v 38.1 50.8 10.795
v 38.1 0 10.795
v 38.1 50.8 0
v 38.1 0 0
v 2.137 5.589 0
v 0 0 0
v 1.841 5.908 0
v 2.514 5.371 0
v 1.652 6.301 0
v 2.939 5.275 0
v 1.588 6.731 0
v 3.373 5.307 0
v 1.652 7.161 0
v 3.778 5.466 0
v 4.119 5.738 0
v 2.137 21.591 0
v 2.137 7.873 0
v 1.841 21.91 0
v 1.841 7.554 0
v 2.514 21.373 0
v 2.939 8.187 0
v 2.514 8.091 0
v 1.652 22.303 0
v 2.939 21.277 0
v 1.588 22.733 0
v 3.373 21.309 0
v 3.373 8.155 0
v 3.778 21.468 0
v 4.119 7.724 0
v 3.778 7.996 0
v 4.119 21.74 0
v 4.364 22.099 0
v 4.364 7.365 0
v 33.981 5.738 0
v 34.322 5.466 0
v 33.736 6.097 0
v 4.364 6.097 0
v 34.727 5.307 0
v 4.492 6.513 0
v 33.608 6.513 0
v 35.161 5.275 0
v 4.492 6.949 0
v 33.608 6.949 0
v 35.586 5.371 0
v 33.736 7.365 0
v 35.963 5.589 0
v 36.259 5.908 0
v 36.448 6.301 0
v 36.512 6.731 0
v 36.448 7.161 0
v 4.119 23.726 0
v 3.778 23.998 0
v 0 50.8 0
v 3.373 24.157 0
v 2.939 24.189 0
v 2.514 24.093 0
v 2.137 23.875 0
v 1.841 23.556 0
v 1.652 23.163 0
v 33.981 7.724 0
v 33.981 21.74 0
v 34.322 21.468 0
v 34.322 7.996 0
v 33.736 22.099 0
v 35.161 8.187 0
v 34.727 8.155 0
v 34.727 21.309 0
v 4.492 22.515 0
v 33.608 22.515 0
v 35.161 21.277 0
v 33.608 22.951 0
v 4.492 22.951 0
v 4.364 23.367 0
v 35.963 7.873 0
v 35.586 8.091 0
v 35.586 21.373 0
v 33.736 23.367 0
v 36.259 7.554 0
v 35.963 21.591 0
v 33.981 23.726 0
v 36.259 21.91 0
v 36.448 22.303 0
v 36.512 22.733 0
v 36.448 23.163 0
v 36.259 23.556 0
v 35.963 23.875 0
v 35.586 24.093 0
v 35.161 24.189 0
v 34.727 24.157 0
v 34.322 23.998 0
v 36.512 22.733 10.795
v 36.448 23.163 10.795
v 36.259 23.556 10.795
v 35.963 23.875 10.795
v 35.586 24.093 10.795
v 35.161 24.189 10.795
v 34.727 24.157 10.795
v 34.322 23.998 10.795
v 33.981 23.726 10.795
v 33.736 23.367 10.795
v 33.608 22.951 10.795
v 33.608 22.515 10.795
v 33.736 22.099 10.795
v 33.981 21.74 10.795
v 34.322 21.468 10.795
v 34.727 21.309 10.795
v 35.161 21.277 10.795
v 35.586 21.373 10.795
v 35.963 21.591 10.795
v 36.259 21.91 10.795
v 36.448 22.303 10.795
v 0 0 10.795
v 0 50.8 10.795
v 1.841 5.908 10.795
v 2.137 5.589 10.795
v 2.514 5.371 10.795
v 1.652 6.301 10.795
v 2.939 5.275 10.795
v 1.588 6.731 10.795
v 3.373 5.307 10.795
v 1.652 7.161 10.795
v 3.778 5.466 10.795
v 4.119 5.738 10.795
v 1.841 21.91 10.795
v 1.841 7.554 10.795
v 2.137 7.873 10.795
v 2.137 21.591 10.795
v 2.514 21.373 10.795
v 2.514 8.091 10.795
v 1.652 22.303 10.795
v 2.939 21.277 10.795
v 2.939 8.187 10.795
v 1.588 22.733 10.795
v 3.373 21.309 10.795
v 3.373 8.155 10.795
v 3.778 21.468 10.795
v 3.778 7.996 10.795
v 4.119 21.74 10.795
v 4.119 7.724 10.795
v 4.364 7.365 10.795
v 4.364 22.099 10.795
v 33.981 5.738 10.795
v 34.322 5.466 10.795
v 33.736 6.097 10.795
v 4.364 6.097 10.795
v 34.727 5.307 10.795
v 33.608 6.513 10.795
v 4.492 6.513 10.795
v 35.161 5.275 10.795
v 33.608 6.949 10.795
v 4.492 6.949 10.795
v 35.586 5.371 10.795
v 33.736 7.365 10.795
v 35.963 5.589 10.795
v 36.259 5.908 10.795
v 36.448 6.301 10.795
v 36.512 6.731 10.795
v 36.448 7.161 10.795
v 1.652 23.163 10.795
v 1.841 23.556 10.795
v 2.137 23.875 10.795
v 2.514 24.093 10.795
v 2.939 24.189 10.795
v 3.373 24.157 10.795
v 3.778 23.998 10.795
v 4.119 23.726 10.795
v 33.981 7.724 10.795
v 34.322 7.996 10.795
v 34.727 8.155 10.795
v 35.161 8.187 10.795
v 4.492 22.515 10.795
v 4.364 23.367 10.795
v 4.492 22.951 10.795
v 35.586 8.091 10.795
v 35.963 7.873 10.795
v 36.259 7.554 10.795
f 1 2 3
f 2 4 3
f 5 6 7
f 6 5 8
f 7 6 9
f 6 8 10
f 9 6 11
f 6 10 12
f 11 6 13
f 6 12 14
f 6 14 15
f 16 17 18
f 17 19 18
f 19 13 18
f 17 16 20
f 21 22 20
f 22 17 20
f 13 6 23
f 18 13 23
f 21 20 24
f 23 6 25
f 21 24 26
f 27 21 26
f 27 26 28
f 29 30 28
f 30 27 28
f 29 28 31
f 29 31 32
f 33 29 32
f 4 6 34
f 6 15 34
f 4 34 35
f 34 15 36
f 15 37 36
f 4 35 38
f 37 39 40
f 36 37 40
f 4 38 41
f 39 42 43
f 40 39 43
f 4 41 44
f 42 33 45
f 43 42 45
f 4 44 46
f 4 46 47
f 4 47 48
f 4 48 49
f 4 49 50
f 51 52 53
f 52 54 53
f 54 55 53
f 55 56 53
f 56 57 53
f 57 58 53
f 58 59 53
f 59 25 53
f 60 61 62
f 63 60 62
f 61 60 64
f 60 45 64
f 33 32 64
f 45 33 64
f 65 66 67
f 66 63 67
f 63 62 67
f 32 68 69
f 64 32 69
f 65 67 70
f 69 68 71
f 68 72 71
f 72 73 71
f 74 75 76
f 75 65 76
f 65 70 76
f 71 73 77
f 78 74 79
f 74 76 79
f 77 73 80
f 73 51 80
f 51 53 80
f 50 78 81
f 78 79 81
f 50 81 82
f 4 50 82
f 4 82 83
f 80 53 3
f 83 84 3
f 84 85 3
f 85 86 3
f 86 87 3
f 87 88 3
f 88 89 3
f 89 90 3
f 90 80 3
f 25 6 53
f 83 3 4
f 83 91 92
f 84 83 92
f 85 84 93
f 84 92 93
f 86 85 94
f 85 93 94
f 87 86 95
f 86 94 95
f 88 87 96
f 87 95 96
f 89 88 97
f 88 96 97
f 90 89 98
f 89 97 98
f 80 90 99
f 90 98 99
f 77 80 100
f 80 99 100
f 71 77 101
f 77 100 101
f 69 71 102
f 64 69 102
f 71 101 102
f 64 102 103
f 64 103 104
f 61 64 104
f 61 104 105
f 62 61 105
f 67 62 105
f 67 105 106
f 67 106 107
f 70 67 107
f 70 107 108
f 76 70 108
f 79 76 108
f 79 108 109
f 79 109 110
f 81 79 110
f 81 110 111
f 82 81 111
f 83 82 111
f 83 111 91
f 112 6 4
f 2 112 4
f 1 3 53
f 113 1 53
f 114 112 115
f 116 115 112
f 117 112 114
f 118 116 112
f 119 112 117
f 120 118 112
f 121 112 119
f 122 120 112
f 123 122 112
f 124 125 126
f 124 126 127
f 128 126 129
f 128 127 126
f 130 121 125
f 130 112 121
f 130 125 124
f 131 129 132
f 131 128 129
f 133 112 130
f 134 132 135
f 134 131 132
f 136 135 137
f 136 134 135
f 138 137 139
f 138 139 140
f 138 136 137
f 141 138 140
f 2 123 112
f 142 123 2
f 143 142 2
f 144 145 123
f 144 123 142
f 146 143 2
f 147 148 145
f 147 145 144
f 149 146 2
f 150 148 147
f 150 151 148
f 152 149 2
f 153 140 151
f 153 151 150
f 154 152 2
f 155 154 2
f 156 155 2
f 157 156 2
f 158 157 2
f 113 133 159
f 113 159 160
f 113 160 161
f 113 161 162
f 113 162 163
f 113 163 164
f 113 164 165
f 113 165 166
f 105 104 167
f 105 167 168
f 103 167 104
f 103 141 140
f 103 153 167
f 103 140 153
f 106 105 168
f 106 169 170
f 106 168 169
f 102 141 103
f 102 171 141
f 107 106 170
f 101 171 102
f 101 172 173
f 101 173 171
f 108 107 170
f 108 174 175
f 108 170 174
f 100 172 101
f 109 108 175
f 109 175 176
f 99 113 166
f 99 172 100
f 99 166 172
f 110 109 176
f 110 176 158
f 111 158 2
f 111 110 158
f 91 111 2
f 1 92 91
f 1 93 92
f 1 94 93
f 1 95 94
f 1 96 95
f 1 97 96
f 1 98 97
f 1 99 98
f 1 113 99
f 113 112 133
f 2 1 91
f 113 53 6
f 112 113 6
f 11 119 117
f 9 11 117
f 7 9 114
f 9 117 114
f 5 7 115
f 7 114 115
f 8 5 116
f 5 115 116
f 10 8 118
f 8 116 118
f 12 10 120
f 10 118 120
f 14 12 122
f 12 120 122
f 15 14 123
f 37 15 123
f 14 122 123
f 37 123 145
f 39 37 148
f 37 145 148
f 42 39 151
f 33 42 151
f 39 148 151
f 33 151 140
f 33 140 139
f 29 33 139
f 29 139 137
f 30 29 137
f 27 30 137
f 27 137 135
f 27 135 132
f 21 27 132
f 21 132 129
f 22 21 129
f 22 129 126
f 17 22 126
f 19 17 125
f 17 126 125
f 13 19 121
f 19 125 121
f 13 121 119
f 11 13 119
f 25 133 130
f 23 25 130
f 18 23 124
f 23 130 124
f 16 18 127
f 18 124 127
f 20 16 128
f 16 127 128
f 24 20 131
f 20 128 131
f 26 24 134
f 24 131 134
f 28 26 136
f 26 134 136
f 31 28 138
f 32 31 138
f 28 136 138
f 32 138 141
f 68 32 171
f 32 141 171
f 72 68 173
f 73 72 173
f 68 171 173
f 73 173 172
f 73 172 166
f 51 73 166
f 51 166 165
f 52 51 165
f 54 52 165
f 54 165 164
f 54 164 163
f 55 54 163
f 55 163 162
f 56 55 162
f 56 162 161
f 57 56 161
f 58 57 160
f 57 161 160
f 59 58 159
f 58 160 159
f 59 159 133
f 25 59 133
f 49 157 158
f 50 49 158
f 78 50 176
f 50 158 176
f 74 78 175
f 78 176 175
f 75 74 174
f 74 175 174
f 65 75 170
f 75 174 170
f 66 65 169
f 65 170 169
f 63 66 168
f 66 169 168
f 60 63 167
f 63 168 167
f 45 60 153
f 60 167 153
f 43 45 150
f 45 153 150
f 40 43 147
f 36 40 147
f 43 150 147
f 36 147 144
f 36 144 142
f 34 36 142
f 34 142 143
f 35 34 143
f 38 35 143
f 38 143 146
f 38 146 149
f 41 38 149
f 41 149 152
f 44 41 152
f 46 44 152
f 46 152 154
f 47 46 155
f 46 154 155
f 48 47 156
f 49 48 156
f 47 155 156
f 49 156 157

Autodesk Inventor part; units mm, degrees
ref_plane "YZ Plane" through (0, 0, 0) normal (1, 0, 0) x (0, 1, 0)
ref_plane "XZ Plane" through (0, 0, 0) normal (0, 1, 0) x (-1, 0, 0)
sketch "Sketch1" plane through (0, 0, 0) normal (0, 0, 1) x (1, 0, 0)
  line L0 (0, 0) -> (38.1, 0)
  line L1 (38.1, 0) -> (38.1, 50.8)
  line L2 (38.1, 50.8) -> (0, 50.8)
  line L3 (0, 50.8) -> (0, 0)
  dimension "d0" = 38.1
  dimension "d1" = 50.8
extrude "Extrusion1" add sketch "Sketch1" along normal blind 10.795
sketch "Sketch2" plane through (0, 0, 10.795) normal (0, 0, 1) x (1, 0, 0)
  line L0 (38.1, 0) -> (38.1, 50.8) projected
  line L1 (0, 0) -> (38.1, 0) projected
  circle A0 centre (35.052, 6.731) radius 1.4605
  circle A1 centre (35.052, 22.733) radius 1.4605
  dimension "d4" = 3.048
  dimension "d5" = 3.048
  dimension "d6" = 16.002
  dimension "d7" = 6.731
  dimension "d8" = 2.921
  dimension "d9" = 2.921
extrude "Extrusion2" cut sketch "Sketch2" against normal through all
ref_plane "Work Plane1" through (19.05, 0, 0) normal (1, 0, 0) x (0, 0, -1)
mirror "Mirror1" about plane through (19.05, 0, 0) normal (1, 0, 0) of "Extrusion2"
properties part number "Motor spacer"
